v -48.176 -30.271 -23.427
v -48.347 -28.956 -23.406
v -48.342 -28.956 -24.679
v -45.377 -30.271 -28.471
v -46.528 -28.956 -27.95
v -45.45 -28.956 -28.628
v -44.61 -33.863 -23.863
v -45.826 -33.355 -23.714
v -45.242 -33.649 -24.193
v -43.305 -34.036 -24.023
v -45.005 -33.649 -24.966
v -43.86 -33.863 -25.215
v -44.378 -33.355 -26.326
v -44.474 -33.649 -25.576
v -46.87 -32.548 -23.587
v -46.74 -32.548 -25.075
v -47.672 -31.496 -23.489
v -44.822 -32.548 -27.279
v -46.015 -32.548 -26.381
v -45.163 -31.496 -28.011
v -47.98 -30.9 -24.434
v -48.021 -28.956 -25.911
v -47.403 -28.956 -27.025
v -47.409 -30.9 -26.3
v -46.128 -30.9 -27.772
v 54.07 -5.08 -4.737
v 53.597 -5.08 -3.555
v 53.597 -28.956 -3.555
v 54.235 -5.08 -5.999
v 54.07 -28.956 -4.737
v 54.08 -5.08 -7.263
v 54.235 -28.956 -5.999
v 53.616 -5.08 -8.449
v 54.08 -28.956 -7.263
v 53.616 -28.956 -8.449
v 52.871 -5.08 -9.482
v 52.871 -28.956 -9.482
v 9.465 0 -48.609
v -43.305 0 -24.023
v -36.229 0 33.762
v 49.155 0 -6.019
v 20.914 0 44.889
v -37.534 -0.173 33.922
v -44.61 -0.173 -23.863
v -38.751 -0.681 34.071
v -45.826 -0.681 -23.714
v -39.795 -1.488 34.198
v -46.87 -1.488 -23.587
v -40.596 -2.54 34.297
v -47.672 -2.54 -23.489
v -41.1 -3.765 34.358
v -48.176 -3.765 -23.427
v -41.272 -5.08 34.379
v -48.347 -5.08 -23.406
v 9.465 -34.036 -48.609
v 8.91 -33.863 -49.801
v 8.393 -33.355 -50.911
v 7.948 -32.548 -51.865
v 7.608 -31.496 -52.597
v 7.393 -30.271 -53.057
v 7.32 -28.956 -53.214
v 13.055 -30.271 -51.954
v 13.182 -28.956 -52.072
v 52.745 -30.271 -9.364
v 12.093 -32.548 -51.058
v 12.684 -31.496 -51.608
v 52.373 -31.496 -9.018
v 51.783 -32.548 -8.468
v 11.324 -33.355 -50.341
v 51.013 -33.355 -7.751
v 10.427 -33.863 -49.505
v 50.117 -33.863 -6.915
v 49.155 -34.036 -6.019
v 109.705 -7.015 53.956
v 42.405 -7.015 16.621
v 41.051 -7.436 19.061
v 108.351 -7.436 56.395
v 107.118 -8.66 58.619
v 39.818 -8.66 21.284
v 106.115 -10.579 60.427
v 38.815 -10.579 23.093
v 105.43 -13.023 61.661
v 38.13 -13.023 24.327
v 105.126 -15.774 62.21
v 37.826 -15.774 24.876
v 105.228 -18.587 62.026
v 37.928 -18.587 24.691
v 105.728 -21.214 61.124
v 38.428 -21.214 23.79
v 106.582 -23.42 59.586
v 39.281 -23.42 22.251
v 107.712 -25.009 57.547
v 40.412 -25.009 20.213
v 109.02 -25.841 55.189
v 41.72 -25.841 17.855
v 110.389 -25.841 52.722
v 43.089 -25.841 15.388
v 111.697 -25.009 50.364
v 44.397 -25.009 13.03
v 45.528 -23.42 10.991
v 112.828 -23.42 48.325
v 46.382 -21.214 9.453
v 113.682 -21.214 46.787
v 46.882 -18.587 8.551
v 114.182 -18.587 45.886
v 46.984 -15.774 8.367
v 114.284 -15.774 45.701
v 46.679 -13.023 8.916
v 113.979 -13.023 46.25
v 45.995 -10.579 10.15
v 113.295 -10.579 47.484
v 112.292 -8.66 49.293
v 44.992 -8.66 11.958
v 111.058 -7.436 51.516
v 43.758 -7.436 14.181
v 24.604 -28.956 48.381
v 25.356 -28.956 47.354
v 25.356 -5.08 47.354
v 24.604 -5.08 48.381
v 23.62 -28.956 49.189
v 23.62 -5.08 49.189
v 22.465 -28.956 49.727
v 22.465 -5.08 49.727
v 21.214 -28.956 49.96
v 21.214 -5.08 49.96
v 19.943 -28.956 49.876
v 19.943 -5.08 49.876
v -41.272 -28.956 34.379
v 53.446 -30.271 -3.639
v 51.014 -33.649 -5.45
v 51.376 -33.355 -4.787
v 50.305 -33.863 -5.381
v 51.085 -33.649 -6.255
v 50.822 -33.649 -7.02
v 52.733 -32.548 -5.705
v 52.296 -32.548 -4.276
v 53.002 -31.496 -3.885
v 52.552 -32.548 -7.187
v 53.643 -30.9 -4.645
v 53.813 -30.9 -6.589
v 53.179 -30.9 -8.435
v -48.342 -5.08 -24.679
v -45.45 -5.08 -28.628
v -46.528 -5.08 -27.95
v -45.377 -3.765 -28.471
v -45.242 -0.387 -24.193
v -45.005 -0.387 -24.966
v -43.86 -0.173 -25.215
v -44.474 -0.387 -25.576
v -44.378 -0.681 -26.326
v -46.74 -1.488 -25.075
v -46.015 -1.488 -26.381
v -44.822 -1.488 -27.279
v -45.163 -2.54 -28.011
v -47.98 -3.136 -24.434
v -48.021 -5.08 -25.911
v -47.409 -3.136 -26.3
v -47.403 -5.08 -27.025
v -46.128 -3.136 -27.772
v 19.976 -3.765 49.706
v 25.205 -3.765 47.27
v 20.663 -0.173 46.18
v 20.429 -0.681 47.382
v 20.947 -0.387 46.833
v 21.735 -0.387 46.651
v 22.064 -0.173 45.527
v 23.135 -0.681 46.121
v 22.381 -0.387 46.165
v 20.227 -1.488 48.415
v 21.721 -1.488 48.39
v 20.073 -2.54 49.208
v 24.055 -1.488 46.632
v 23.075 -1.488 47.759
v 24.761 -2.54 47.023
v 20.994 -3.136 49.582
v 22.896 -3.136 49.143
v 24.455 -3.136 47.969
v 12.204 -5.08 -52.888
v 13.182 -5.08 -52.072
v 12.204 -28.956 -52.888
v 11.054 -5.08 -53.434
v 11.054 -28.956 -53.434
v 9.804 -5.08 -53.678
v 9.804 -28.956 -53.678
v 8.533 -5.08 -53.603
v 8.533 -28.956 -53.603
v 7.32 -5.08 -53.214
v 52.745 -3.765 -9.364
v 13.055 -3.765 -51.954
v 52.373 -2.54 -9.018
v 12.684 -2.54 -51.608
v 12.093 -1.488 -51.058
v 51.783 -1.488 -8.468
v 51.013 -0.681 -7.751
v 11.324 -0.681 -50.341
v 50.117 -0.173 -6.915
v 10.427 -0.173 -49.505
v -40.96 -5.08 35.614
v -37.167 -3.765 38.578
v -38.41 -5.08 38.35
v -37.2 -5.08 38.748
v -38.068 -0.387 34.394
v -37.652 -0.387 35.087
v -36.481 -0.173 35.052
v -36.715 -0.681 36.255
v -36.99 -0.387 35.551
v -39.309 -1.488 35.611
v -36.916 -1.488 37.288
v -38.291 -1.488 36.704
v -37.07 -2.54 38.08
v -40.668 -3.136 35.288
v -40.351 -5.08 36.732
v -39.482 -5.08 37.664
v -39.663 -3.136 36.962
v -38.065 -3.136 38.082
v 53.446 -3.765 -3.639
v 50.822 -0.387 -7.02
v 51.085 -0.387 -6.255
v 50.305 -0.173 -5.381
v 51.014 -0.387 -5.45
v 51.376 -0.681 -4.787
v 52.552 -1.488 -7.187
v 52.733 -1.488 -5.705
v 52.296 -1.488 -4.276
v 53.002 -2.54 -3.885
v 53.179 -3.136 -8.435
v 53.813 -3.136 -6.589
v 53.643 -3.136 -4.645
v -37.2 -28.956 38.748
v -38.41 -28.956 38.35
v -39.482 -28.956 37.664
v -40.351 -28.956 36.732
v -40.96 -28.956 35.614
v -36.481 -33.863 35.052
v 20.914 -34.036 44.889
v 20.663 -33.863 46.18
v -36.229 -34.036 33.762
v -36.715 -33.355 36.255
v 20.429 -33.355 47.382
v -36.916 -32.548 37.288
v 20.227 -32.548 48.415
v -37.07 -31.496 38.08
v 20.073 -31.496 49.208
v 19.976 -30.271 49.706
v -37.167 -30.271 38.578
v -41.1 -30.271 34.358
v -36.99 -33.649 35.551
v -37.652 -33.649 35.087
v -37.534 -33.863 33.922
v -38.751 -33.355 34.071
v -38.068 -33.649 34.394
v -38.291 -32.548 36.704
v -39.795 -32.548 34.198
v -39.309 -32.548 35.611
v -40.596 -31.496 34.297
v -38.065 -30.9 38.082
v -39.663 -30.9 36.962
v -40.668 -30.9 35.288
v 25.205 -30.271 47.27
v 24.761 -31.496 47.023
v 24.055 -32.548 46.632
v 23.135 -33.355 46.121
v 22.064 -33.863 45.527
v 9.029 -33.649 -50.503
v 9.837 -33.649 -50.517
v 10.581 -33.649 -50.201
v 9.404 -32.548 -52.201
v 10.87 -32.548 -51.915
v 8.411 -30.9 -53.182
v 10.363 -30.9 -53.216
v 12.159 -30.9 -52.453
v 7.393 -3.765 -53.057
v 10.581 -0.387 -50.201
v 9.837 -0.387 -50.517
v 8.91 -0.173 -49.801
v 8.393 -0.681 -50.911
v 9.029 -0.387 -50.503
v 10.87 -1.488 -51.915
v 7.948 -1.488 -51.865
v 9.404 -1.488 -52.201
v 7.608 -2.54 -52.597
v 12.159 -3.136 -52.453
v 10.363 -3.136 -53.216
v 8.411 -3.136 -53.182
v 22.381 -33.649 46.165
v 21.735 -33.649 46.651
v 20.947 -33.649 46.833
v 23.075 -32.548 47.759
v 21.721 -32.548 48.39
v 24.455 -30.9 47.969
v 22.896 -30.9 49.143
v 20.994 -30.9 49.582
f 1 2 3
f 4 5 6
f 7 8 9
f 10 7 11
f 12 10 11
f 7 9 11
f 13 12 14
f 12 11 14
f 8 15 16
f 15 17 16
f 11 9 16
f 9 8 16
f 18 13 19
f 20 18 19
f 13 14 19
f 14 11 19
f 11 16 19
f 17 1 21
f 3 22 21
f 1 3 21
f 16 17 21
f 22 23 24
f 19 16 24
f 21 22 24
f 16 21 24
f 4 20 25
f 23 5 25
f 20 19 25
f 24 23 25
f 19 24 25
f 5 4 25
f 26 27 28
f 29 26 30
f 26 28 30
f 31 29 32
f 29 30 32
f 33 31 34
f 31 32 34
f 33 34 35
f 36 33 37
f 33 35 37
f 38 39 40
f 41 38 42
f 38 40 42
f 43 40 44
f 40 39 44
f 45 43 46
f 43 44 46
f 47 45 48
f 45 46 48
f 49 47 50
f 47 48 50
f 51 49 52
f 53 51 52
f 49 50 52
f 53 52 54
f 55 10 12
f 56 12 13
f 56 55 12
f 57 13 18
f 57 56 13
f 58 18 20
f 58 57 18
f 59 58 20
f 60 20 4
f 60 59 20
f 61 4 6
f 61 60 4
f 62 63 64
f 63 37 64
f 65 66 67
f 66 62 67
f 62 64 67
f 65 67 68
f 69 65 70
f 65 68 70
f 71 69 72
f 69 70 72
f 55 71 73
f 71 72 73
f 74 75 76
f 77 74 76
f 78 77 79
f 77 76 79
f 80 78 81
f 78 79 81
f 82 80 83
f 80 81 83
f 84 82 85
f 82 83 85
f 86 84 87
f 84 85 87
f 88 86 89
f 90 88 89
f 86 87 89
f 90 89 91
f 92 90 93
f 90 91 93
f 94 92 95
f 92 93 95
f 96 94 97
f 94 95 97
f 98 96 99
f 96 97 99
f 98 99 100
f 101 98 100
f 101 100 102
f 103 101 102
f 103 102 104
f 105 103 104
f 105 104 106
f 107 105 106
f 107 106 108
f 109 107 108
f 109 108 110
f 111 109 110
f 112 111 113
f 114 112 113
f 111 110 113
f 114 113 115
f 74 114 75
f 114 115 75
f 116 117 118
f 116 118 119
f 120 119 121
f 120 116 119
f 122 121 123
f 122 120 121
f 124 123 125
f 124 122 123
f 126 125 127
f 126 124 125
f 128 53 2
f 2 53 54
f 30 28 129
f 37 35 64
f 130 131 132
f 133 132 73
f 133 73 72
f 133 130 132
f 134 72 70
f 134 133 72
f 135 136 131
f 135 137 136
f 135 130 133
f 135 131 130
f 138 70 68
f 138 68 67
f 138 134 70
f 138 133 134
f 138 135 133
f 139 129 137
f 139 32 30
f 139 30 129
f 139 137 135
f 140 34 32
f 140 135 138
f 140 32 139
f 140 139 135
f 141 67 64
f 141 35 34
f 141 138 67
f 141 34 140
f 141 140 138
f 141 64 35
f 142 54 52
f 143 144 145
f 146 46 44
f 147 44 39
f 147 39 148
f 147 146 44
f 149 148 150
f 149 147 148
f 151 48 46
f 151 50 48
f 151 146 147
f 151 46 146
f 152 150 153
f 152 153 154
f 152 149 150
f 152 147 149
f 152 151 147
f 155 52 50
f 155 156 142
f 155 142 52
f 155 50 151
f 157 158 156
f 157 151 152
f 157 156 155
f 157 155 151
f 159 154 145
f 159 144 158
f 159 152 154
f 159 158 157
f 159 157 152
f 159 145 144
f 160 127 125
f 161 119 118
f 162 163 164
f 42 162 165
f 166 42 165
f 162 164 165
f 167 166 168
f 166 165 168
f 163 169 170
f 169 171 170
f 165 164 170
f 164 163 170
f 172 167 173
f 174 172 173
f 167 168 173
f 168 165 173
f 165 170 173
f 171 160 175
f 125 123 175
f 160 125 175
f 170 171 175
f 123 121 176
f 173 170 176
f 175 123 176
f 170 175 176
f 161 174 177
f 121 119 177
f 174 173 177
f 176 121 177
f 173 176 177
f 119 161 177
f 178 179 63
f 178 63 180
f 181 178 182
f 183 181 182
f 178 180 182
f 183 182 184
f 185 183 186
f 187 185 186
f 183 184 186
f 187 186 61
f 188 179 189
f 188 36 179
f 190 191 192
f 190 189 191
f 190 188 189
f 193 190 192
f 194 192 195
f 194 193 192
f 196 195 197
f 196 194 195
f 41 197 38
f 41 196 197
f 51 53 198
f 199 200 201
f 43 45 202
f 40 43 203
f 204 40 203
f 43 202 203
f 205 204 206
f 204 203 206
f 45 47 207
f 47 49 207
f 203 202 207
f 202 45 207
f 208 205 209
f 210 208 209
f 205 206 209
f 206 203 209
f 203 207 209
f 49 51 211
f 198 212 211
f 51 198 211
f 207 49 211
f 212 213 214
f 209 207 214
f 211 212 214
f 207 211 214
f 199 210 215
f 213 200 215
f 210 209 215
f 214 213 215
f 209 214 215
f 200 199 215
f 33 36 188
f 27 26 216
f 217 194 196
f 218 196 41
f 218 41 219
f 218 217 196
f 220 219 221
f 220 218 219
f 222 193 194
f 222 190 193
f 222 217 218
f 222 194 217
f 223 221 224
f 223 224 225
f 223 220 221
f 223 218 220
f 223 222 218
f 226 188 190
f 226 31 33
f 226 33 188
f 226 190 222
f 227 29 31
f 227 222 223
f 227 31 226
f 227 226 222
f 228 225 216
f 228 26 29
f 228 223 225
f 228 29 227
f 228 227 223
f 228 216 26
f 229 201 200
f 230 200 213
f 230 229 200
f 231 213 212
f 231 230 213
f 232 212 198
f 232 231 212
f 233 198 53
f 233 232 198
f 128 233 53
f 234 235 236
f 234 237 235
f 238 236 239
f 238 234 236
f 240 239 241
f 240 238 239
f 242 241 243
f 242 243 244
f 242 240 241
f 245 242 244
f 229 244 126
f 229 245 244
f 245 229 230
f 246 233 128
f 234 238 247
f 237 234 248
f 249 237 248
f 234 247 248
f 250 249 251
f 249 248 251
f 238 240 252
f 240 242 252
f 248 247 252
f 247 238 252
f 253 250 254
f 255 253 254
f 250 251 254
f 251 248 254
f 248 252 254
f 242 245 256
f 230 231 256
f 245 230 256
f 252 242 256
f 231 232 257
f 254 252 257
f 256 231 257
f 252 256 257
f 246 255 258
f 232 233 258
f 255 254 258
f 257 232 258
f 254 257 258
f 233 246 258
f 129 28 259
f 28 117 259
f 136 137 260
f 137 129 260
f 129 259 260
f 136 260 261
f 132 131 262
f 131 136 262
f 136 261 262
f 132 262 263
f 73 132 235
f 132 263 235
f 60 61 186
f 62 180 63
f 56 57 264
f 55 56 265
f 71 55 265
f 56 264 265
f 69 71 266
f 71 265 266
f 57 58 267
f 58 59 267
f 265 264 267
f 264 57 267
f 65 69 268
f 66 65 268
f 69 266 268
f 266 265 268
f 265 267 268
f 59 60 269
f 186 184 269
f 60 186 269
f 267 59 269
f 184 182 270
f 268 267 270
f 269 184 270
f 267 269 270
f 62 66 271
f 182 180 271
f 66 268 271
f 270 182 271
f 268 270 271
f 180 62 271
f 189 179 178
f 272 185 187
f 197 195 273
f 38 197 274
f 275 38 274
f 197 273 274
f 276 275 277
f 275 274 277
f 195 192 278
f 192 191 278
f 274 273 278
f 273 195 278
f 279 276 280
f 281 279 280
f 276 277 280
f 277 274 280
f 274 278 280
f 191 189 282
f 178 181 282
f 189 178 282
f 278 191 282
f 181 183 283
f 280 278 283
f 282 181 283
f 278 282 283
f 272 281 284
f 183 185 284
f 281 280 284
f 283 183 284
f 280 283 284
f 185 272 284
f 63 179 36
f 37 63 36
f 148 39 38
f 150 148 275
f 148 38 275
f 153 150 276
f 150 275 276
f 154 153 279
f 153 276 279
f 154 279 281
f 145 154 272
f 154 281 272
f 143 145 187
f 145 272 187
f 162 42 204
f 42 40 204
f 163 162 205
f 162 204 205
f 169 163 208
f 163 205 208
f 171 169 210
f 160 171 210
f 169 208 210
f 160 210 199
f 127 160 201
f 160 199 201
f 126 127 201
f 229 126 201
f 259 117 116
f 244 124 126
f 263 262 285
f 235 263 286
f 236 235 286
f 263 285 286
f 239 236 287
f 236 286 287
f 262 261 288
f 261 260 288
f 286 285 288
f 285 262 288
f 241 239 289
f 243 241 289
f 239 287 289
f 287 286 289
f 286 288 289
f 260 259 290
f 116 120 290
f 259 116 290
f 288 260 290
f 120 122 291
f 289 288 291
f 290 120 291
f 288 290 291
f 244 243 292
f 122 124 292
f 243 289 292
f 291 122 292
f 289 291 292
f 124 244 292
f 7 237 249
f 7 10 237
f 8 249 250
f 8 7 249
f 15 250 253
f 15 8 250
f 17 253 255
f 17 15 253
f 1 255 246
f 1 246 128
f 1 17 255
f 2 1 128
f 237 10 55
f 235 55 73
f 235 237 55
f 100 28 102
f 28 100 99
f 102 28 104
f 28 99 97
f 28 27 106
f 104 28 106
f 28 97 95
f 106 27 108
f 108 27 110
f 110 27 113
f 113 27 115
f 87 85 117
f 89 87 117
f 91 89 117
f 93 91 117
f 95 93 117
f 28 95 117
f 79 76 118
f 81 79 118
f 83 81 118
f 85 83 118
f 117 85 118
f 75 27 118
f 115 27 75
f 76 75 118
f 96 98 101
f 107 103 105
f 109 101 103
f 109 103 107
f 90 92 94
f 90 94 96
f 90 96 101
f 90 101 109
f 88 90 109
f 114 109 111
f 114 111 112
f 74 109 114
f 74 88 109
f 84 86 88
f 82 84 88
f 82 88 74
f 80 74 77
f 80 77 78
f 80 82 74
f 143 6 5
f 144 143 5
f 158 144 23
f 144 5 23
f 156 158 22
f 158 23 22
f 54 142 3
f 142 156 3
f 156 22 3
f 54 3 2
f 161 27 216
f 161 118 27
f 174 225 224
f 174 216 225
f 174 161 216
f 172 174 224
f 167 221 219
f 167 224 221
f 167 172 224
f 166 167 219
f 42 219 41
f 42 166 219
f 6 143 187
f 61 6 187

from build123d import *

# Parameters (mm, degrees)
F1_DEPTH = 34.036
F2_R     = 9.4659800125
F3_DEPTH = 76.962
F4_R     = 5.08


with BuildPart() as f1:
    # F0 (on Front) → F1 (new body)
    with BuildSketch(Plane.XZ):
        Polygon((55.3876371372, -6.7820224733), (23.5658078206, 50.581013021), (-40.8231669317, 38.0428077057), (-48.7959125128, -27.0692648314), (10.6656344867, -54.772533422), align=None)
    extrude(amount=F1_DEPTH)

    # F2 (on face) → F3 (join)
    with BuildSketch(Plane(origin=(39.4767224789, 0, 21.8994952738), x_dir=(0, 1, 0), z_dir=(0.8744581925, 0, 0.4851008861))):
        with Locations((-16.4809413254, -6.0359826311)):
            Circle(F2_R)
    extrude(amount=F3_DEPTH)

    # F4
    f4_edges = [f1.edges().sort_by_distance(p)[0] for p in [
        (39.476722, 0, 21.899495),
        (55.387637, -17.018, -6.782022),
        (23.565808, -17.018, 50.581013),
        (39.476722, -34.036, 21.899495),
        (33.026636, -34.036, -30.777278),
        (10.665634, -17.018, -54.772533),
        (33.026636, 0, -30.777278),
        (-8.62868, 0, 44.31191),
        (-8.62868, -34.036, 44.31191),
        (-44.80954, -34.036, 5.486771),
        (-19.065139, -34.036, -40.920899),
        (-40.823167, -17.018, 38.042808),
        (-48.795913, -17.018, -27.069265),
        (-44.80954, 0, 5.486771),
        (-19.065139, 0, -40.920899),
    ]]
    fillet(f4_edges, radius=F4_R)


solid = f1.part
